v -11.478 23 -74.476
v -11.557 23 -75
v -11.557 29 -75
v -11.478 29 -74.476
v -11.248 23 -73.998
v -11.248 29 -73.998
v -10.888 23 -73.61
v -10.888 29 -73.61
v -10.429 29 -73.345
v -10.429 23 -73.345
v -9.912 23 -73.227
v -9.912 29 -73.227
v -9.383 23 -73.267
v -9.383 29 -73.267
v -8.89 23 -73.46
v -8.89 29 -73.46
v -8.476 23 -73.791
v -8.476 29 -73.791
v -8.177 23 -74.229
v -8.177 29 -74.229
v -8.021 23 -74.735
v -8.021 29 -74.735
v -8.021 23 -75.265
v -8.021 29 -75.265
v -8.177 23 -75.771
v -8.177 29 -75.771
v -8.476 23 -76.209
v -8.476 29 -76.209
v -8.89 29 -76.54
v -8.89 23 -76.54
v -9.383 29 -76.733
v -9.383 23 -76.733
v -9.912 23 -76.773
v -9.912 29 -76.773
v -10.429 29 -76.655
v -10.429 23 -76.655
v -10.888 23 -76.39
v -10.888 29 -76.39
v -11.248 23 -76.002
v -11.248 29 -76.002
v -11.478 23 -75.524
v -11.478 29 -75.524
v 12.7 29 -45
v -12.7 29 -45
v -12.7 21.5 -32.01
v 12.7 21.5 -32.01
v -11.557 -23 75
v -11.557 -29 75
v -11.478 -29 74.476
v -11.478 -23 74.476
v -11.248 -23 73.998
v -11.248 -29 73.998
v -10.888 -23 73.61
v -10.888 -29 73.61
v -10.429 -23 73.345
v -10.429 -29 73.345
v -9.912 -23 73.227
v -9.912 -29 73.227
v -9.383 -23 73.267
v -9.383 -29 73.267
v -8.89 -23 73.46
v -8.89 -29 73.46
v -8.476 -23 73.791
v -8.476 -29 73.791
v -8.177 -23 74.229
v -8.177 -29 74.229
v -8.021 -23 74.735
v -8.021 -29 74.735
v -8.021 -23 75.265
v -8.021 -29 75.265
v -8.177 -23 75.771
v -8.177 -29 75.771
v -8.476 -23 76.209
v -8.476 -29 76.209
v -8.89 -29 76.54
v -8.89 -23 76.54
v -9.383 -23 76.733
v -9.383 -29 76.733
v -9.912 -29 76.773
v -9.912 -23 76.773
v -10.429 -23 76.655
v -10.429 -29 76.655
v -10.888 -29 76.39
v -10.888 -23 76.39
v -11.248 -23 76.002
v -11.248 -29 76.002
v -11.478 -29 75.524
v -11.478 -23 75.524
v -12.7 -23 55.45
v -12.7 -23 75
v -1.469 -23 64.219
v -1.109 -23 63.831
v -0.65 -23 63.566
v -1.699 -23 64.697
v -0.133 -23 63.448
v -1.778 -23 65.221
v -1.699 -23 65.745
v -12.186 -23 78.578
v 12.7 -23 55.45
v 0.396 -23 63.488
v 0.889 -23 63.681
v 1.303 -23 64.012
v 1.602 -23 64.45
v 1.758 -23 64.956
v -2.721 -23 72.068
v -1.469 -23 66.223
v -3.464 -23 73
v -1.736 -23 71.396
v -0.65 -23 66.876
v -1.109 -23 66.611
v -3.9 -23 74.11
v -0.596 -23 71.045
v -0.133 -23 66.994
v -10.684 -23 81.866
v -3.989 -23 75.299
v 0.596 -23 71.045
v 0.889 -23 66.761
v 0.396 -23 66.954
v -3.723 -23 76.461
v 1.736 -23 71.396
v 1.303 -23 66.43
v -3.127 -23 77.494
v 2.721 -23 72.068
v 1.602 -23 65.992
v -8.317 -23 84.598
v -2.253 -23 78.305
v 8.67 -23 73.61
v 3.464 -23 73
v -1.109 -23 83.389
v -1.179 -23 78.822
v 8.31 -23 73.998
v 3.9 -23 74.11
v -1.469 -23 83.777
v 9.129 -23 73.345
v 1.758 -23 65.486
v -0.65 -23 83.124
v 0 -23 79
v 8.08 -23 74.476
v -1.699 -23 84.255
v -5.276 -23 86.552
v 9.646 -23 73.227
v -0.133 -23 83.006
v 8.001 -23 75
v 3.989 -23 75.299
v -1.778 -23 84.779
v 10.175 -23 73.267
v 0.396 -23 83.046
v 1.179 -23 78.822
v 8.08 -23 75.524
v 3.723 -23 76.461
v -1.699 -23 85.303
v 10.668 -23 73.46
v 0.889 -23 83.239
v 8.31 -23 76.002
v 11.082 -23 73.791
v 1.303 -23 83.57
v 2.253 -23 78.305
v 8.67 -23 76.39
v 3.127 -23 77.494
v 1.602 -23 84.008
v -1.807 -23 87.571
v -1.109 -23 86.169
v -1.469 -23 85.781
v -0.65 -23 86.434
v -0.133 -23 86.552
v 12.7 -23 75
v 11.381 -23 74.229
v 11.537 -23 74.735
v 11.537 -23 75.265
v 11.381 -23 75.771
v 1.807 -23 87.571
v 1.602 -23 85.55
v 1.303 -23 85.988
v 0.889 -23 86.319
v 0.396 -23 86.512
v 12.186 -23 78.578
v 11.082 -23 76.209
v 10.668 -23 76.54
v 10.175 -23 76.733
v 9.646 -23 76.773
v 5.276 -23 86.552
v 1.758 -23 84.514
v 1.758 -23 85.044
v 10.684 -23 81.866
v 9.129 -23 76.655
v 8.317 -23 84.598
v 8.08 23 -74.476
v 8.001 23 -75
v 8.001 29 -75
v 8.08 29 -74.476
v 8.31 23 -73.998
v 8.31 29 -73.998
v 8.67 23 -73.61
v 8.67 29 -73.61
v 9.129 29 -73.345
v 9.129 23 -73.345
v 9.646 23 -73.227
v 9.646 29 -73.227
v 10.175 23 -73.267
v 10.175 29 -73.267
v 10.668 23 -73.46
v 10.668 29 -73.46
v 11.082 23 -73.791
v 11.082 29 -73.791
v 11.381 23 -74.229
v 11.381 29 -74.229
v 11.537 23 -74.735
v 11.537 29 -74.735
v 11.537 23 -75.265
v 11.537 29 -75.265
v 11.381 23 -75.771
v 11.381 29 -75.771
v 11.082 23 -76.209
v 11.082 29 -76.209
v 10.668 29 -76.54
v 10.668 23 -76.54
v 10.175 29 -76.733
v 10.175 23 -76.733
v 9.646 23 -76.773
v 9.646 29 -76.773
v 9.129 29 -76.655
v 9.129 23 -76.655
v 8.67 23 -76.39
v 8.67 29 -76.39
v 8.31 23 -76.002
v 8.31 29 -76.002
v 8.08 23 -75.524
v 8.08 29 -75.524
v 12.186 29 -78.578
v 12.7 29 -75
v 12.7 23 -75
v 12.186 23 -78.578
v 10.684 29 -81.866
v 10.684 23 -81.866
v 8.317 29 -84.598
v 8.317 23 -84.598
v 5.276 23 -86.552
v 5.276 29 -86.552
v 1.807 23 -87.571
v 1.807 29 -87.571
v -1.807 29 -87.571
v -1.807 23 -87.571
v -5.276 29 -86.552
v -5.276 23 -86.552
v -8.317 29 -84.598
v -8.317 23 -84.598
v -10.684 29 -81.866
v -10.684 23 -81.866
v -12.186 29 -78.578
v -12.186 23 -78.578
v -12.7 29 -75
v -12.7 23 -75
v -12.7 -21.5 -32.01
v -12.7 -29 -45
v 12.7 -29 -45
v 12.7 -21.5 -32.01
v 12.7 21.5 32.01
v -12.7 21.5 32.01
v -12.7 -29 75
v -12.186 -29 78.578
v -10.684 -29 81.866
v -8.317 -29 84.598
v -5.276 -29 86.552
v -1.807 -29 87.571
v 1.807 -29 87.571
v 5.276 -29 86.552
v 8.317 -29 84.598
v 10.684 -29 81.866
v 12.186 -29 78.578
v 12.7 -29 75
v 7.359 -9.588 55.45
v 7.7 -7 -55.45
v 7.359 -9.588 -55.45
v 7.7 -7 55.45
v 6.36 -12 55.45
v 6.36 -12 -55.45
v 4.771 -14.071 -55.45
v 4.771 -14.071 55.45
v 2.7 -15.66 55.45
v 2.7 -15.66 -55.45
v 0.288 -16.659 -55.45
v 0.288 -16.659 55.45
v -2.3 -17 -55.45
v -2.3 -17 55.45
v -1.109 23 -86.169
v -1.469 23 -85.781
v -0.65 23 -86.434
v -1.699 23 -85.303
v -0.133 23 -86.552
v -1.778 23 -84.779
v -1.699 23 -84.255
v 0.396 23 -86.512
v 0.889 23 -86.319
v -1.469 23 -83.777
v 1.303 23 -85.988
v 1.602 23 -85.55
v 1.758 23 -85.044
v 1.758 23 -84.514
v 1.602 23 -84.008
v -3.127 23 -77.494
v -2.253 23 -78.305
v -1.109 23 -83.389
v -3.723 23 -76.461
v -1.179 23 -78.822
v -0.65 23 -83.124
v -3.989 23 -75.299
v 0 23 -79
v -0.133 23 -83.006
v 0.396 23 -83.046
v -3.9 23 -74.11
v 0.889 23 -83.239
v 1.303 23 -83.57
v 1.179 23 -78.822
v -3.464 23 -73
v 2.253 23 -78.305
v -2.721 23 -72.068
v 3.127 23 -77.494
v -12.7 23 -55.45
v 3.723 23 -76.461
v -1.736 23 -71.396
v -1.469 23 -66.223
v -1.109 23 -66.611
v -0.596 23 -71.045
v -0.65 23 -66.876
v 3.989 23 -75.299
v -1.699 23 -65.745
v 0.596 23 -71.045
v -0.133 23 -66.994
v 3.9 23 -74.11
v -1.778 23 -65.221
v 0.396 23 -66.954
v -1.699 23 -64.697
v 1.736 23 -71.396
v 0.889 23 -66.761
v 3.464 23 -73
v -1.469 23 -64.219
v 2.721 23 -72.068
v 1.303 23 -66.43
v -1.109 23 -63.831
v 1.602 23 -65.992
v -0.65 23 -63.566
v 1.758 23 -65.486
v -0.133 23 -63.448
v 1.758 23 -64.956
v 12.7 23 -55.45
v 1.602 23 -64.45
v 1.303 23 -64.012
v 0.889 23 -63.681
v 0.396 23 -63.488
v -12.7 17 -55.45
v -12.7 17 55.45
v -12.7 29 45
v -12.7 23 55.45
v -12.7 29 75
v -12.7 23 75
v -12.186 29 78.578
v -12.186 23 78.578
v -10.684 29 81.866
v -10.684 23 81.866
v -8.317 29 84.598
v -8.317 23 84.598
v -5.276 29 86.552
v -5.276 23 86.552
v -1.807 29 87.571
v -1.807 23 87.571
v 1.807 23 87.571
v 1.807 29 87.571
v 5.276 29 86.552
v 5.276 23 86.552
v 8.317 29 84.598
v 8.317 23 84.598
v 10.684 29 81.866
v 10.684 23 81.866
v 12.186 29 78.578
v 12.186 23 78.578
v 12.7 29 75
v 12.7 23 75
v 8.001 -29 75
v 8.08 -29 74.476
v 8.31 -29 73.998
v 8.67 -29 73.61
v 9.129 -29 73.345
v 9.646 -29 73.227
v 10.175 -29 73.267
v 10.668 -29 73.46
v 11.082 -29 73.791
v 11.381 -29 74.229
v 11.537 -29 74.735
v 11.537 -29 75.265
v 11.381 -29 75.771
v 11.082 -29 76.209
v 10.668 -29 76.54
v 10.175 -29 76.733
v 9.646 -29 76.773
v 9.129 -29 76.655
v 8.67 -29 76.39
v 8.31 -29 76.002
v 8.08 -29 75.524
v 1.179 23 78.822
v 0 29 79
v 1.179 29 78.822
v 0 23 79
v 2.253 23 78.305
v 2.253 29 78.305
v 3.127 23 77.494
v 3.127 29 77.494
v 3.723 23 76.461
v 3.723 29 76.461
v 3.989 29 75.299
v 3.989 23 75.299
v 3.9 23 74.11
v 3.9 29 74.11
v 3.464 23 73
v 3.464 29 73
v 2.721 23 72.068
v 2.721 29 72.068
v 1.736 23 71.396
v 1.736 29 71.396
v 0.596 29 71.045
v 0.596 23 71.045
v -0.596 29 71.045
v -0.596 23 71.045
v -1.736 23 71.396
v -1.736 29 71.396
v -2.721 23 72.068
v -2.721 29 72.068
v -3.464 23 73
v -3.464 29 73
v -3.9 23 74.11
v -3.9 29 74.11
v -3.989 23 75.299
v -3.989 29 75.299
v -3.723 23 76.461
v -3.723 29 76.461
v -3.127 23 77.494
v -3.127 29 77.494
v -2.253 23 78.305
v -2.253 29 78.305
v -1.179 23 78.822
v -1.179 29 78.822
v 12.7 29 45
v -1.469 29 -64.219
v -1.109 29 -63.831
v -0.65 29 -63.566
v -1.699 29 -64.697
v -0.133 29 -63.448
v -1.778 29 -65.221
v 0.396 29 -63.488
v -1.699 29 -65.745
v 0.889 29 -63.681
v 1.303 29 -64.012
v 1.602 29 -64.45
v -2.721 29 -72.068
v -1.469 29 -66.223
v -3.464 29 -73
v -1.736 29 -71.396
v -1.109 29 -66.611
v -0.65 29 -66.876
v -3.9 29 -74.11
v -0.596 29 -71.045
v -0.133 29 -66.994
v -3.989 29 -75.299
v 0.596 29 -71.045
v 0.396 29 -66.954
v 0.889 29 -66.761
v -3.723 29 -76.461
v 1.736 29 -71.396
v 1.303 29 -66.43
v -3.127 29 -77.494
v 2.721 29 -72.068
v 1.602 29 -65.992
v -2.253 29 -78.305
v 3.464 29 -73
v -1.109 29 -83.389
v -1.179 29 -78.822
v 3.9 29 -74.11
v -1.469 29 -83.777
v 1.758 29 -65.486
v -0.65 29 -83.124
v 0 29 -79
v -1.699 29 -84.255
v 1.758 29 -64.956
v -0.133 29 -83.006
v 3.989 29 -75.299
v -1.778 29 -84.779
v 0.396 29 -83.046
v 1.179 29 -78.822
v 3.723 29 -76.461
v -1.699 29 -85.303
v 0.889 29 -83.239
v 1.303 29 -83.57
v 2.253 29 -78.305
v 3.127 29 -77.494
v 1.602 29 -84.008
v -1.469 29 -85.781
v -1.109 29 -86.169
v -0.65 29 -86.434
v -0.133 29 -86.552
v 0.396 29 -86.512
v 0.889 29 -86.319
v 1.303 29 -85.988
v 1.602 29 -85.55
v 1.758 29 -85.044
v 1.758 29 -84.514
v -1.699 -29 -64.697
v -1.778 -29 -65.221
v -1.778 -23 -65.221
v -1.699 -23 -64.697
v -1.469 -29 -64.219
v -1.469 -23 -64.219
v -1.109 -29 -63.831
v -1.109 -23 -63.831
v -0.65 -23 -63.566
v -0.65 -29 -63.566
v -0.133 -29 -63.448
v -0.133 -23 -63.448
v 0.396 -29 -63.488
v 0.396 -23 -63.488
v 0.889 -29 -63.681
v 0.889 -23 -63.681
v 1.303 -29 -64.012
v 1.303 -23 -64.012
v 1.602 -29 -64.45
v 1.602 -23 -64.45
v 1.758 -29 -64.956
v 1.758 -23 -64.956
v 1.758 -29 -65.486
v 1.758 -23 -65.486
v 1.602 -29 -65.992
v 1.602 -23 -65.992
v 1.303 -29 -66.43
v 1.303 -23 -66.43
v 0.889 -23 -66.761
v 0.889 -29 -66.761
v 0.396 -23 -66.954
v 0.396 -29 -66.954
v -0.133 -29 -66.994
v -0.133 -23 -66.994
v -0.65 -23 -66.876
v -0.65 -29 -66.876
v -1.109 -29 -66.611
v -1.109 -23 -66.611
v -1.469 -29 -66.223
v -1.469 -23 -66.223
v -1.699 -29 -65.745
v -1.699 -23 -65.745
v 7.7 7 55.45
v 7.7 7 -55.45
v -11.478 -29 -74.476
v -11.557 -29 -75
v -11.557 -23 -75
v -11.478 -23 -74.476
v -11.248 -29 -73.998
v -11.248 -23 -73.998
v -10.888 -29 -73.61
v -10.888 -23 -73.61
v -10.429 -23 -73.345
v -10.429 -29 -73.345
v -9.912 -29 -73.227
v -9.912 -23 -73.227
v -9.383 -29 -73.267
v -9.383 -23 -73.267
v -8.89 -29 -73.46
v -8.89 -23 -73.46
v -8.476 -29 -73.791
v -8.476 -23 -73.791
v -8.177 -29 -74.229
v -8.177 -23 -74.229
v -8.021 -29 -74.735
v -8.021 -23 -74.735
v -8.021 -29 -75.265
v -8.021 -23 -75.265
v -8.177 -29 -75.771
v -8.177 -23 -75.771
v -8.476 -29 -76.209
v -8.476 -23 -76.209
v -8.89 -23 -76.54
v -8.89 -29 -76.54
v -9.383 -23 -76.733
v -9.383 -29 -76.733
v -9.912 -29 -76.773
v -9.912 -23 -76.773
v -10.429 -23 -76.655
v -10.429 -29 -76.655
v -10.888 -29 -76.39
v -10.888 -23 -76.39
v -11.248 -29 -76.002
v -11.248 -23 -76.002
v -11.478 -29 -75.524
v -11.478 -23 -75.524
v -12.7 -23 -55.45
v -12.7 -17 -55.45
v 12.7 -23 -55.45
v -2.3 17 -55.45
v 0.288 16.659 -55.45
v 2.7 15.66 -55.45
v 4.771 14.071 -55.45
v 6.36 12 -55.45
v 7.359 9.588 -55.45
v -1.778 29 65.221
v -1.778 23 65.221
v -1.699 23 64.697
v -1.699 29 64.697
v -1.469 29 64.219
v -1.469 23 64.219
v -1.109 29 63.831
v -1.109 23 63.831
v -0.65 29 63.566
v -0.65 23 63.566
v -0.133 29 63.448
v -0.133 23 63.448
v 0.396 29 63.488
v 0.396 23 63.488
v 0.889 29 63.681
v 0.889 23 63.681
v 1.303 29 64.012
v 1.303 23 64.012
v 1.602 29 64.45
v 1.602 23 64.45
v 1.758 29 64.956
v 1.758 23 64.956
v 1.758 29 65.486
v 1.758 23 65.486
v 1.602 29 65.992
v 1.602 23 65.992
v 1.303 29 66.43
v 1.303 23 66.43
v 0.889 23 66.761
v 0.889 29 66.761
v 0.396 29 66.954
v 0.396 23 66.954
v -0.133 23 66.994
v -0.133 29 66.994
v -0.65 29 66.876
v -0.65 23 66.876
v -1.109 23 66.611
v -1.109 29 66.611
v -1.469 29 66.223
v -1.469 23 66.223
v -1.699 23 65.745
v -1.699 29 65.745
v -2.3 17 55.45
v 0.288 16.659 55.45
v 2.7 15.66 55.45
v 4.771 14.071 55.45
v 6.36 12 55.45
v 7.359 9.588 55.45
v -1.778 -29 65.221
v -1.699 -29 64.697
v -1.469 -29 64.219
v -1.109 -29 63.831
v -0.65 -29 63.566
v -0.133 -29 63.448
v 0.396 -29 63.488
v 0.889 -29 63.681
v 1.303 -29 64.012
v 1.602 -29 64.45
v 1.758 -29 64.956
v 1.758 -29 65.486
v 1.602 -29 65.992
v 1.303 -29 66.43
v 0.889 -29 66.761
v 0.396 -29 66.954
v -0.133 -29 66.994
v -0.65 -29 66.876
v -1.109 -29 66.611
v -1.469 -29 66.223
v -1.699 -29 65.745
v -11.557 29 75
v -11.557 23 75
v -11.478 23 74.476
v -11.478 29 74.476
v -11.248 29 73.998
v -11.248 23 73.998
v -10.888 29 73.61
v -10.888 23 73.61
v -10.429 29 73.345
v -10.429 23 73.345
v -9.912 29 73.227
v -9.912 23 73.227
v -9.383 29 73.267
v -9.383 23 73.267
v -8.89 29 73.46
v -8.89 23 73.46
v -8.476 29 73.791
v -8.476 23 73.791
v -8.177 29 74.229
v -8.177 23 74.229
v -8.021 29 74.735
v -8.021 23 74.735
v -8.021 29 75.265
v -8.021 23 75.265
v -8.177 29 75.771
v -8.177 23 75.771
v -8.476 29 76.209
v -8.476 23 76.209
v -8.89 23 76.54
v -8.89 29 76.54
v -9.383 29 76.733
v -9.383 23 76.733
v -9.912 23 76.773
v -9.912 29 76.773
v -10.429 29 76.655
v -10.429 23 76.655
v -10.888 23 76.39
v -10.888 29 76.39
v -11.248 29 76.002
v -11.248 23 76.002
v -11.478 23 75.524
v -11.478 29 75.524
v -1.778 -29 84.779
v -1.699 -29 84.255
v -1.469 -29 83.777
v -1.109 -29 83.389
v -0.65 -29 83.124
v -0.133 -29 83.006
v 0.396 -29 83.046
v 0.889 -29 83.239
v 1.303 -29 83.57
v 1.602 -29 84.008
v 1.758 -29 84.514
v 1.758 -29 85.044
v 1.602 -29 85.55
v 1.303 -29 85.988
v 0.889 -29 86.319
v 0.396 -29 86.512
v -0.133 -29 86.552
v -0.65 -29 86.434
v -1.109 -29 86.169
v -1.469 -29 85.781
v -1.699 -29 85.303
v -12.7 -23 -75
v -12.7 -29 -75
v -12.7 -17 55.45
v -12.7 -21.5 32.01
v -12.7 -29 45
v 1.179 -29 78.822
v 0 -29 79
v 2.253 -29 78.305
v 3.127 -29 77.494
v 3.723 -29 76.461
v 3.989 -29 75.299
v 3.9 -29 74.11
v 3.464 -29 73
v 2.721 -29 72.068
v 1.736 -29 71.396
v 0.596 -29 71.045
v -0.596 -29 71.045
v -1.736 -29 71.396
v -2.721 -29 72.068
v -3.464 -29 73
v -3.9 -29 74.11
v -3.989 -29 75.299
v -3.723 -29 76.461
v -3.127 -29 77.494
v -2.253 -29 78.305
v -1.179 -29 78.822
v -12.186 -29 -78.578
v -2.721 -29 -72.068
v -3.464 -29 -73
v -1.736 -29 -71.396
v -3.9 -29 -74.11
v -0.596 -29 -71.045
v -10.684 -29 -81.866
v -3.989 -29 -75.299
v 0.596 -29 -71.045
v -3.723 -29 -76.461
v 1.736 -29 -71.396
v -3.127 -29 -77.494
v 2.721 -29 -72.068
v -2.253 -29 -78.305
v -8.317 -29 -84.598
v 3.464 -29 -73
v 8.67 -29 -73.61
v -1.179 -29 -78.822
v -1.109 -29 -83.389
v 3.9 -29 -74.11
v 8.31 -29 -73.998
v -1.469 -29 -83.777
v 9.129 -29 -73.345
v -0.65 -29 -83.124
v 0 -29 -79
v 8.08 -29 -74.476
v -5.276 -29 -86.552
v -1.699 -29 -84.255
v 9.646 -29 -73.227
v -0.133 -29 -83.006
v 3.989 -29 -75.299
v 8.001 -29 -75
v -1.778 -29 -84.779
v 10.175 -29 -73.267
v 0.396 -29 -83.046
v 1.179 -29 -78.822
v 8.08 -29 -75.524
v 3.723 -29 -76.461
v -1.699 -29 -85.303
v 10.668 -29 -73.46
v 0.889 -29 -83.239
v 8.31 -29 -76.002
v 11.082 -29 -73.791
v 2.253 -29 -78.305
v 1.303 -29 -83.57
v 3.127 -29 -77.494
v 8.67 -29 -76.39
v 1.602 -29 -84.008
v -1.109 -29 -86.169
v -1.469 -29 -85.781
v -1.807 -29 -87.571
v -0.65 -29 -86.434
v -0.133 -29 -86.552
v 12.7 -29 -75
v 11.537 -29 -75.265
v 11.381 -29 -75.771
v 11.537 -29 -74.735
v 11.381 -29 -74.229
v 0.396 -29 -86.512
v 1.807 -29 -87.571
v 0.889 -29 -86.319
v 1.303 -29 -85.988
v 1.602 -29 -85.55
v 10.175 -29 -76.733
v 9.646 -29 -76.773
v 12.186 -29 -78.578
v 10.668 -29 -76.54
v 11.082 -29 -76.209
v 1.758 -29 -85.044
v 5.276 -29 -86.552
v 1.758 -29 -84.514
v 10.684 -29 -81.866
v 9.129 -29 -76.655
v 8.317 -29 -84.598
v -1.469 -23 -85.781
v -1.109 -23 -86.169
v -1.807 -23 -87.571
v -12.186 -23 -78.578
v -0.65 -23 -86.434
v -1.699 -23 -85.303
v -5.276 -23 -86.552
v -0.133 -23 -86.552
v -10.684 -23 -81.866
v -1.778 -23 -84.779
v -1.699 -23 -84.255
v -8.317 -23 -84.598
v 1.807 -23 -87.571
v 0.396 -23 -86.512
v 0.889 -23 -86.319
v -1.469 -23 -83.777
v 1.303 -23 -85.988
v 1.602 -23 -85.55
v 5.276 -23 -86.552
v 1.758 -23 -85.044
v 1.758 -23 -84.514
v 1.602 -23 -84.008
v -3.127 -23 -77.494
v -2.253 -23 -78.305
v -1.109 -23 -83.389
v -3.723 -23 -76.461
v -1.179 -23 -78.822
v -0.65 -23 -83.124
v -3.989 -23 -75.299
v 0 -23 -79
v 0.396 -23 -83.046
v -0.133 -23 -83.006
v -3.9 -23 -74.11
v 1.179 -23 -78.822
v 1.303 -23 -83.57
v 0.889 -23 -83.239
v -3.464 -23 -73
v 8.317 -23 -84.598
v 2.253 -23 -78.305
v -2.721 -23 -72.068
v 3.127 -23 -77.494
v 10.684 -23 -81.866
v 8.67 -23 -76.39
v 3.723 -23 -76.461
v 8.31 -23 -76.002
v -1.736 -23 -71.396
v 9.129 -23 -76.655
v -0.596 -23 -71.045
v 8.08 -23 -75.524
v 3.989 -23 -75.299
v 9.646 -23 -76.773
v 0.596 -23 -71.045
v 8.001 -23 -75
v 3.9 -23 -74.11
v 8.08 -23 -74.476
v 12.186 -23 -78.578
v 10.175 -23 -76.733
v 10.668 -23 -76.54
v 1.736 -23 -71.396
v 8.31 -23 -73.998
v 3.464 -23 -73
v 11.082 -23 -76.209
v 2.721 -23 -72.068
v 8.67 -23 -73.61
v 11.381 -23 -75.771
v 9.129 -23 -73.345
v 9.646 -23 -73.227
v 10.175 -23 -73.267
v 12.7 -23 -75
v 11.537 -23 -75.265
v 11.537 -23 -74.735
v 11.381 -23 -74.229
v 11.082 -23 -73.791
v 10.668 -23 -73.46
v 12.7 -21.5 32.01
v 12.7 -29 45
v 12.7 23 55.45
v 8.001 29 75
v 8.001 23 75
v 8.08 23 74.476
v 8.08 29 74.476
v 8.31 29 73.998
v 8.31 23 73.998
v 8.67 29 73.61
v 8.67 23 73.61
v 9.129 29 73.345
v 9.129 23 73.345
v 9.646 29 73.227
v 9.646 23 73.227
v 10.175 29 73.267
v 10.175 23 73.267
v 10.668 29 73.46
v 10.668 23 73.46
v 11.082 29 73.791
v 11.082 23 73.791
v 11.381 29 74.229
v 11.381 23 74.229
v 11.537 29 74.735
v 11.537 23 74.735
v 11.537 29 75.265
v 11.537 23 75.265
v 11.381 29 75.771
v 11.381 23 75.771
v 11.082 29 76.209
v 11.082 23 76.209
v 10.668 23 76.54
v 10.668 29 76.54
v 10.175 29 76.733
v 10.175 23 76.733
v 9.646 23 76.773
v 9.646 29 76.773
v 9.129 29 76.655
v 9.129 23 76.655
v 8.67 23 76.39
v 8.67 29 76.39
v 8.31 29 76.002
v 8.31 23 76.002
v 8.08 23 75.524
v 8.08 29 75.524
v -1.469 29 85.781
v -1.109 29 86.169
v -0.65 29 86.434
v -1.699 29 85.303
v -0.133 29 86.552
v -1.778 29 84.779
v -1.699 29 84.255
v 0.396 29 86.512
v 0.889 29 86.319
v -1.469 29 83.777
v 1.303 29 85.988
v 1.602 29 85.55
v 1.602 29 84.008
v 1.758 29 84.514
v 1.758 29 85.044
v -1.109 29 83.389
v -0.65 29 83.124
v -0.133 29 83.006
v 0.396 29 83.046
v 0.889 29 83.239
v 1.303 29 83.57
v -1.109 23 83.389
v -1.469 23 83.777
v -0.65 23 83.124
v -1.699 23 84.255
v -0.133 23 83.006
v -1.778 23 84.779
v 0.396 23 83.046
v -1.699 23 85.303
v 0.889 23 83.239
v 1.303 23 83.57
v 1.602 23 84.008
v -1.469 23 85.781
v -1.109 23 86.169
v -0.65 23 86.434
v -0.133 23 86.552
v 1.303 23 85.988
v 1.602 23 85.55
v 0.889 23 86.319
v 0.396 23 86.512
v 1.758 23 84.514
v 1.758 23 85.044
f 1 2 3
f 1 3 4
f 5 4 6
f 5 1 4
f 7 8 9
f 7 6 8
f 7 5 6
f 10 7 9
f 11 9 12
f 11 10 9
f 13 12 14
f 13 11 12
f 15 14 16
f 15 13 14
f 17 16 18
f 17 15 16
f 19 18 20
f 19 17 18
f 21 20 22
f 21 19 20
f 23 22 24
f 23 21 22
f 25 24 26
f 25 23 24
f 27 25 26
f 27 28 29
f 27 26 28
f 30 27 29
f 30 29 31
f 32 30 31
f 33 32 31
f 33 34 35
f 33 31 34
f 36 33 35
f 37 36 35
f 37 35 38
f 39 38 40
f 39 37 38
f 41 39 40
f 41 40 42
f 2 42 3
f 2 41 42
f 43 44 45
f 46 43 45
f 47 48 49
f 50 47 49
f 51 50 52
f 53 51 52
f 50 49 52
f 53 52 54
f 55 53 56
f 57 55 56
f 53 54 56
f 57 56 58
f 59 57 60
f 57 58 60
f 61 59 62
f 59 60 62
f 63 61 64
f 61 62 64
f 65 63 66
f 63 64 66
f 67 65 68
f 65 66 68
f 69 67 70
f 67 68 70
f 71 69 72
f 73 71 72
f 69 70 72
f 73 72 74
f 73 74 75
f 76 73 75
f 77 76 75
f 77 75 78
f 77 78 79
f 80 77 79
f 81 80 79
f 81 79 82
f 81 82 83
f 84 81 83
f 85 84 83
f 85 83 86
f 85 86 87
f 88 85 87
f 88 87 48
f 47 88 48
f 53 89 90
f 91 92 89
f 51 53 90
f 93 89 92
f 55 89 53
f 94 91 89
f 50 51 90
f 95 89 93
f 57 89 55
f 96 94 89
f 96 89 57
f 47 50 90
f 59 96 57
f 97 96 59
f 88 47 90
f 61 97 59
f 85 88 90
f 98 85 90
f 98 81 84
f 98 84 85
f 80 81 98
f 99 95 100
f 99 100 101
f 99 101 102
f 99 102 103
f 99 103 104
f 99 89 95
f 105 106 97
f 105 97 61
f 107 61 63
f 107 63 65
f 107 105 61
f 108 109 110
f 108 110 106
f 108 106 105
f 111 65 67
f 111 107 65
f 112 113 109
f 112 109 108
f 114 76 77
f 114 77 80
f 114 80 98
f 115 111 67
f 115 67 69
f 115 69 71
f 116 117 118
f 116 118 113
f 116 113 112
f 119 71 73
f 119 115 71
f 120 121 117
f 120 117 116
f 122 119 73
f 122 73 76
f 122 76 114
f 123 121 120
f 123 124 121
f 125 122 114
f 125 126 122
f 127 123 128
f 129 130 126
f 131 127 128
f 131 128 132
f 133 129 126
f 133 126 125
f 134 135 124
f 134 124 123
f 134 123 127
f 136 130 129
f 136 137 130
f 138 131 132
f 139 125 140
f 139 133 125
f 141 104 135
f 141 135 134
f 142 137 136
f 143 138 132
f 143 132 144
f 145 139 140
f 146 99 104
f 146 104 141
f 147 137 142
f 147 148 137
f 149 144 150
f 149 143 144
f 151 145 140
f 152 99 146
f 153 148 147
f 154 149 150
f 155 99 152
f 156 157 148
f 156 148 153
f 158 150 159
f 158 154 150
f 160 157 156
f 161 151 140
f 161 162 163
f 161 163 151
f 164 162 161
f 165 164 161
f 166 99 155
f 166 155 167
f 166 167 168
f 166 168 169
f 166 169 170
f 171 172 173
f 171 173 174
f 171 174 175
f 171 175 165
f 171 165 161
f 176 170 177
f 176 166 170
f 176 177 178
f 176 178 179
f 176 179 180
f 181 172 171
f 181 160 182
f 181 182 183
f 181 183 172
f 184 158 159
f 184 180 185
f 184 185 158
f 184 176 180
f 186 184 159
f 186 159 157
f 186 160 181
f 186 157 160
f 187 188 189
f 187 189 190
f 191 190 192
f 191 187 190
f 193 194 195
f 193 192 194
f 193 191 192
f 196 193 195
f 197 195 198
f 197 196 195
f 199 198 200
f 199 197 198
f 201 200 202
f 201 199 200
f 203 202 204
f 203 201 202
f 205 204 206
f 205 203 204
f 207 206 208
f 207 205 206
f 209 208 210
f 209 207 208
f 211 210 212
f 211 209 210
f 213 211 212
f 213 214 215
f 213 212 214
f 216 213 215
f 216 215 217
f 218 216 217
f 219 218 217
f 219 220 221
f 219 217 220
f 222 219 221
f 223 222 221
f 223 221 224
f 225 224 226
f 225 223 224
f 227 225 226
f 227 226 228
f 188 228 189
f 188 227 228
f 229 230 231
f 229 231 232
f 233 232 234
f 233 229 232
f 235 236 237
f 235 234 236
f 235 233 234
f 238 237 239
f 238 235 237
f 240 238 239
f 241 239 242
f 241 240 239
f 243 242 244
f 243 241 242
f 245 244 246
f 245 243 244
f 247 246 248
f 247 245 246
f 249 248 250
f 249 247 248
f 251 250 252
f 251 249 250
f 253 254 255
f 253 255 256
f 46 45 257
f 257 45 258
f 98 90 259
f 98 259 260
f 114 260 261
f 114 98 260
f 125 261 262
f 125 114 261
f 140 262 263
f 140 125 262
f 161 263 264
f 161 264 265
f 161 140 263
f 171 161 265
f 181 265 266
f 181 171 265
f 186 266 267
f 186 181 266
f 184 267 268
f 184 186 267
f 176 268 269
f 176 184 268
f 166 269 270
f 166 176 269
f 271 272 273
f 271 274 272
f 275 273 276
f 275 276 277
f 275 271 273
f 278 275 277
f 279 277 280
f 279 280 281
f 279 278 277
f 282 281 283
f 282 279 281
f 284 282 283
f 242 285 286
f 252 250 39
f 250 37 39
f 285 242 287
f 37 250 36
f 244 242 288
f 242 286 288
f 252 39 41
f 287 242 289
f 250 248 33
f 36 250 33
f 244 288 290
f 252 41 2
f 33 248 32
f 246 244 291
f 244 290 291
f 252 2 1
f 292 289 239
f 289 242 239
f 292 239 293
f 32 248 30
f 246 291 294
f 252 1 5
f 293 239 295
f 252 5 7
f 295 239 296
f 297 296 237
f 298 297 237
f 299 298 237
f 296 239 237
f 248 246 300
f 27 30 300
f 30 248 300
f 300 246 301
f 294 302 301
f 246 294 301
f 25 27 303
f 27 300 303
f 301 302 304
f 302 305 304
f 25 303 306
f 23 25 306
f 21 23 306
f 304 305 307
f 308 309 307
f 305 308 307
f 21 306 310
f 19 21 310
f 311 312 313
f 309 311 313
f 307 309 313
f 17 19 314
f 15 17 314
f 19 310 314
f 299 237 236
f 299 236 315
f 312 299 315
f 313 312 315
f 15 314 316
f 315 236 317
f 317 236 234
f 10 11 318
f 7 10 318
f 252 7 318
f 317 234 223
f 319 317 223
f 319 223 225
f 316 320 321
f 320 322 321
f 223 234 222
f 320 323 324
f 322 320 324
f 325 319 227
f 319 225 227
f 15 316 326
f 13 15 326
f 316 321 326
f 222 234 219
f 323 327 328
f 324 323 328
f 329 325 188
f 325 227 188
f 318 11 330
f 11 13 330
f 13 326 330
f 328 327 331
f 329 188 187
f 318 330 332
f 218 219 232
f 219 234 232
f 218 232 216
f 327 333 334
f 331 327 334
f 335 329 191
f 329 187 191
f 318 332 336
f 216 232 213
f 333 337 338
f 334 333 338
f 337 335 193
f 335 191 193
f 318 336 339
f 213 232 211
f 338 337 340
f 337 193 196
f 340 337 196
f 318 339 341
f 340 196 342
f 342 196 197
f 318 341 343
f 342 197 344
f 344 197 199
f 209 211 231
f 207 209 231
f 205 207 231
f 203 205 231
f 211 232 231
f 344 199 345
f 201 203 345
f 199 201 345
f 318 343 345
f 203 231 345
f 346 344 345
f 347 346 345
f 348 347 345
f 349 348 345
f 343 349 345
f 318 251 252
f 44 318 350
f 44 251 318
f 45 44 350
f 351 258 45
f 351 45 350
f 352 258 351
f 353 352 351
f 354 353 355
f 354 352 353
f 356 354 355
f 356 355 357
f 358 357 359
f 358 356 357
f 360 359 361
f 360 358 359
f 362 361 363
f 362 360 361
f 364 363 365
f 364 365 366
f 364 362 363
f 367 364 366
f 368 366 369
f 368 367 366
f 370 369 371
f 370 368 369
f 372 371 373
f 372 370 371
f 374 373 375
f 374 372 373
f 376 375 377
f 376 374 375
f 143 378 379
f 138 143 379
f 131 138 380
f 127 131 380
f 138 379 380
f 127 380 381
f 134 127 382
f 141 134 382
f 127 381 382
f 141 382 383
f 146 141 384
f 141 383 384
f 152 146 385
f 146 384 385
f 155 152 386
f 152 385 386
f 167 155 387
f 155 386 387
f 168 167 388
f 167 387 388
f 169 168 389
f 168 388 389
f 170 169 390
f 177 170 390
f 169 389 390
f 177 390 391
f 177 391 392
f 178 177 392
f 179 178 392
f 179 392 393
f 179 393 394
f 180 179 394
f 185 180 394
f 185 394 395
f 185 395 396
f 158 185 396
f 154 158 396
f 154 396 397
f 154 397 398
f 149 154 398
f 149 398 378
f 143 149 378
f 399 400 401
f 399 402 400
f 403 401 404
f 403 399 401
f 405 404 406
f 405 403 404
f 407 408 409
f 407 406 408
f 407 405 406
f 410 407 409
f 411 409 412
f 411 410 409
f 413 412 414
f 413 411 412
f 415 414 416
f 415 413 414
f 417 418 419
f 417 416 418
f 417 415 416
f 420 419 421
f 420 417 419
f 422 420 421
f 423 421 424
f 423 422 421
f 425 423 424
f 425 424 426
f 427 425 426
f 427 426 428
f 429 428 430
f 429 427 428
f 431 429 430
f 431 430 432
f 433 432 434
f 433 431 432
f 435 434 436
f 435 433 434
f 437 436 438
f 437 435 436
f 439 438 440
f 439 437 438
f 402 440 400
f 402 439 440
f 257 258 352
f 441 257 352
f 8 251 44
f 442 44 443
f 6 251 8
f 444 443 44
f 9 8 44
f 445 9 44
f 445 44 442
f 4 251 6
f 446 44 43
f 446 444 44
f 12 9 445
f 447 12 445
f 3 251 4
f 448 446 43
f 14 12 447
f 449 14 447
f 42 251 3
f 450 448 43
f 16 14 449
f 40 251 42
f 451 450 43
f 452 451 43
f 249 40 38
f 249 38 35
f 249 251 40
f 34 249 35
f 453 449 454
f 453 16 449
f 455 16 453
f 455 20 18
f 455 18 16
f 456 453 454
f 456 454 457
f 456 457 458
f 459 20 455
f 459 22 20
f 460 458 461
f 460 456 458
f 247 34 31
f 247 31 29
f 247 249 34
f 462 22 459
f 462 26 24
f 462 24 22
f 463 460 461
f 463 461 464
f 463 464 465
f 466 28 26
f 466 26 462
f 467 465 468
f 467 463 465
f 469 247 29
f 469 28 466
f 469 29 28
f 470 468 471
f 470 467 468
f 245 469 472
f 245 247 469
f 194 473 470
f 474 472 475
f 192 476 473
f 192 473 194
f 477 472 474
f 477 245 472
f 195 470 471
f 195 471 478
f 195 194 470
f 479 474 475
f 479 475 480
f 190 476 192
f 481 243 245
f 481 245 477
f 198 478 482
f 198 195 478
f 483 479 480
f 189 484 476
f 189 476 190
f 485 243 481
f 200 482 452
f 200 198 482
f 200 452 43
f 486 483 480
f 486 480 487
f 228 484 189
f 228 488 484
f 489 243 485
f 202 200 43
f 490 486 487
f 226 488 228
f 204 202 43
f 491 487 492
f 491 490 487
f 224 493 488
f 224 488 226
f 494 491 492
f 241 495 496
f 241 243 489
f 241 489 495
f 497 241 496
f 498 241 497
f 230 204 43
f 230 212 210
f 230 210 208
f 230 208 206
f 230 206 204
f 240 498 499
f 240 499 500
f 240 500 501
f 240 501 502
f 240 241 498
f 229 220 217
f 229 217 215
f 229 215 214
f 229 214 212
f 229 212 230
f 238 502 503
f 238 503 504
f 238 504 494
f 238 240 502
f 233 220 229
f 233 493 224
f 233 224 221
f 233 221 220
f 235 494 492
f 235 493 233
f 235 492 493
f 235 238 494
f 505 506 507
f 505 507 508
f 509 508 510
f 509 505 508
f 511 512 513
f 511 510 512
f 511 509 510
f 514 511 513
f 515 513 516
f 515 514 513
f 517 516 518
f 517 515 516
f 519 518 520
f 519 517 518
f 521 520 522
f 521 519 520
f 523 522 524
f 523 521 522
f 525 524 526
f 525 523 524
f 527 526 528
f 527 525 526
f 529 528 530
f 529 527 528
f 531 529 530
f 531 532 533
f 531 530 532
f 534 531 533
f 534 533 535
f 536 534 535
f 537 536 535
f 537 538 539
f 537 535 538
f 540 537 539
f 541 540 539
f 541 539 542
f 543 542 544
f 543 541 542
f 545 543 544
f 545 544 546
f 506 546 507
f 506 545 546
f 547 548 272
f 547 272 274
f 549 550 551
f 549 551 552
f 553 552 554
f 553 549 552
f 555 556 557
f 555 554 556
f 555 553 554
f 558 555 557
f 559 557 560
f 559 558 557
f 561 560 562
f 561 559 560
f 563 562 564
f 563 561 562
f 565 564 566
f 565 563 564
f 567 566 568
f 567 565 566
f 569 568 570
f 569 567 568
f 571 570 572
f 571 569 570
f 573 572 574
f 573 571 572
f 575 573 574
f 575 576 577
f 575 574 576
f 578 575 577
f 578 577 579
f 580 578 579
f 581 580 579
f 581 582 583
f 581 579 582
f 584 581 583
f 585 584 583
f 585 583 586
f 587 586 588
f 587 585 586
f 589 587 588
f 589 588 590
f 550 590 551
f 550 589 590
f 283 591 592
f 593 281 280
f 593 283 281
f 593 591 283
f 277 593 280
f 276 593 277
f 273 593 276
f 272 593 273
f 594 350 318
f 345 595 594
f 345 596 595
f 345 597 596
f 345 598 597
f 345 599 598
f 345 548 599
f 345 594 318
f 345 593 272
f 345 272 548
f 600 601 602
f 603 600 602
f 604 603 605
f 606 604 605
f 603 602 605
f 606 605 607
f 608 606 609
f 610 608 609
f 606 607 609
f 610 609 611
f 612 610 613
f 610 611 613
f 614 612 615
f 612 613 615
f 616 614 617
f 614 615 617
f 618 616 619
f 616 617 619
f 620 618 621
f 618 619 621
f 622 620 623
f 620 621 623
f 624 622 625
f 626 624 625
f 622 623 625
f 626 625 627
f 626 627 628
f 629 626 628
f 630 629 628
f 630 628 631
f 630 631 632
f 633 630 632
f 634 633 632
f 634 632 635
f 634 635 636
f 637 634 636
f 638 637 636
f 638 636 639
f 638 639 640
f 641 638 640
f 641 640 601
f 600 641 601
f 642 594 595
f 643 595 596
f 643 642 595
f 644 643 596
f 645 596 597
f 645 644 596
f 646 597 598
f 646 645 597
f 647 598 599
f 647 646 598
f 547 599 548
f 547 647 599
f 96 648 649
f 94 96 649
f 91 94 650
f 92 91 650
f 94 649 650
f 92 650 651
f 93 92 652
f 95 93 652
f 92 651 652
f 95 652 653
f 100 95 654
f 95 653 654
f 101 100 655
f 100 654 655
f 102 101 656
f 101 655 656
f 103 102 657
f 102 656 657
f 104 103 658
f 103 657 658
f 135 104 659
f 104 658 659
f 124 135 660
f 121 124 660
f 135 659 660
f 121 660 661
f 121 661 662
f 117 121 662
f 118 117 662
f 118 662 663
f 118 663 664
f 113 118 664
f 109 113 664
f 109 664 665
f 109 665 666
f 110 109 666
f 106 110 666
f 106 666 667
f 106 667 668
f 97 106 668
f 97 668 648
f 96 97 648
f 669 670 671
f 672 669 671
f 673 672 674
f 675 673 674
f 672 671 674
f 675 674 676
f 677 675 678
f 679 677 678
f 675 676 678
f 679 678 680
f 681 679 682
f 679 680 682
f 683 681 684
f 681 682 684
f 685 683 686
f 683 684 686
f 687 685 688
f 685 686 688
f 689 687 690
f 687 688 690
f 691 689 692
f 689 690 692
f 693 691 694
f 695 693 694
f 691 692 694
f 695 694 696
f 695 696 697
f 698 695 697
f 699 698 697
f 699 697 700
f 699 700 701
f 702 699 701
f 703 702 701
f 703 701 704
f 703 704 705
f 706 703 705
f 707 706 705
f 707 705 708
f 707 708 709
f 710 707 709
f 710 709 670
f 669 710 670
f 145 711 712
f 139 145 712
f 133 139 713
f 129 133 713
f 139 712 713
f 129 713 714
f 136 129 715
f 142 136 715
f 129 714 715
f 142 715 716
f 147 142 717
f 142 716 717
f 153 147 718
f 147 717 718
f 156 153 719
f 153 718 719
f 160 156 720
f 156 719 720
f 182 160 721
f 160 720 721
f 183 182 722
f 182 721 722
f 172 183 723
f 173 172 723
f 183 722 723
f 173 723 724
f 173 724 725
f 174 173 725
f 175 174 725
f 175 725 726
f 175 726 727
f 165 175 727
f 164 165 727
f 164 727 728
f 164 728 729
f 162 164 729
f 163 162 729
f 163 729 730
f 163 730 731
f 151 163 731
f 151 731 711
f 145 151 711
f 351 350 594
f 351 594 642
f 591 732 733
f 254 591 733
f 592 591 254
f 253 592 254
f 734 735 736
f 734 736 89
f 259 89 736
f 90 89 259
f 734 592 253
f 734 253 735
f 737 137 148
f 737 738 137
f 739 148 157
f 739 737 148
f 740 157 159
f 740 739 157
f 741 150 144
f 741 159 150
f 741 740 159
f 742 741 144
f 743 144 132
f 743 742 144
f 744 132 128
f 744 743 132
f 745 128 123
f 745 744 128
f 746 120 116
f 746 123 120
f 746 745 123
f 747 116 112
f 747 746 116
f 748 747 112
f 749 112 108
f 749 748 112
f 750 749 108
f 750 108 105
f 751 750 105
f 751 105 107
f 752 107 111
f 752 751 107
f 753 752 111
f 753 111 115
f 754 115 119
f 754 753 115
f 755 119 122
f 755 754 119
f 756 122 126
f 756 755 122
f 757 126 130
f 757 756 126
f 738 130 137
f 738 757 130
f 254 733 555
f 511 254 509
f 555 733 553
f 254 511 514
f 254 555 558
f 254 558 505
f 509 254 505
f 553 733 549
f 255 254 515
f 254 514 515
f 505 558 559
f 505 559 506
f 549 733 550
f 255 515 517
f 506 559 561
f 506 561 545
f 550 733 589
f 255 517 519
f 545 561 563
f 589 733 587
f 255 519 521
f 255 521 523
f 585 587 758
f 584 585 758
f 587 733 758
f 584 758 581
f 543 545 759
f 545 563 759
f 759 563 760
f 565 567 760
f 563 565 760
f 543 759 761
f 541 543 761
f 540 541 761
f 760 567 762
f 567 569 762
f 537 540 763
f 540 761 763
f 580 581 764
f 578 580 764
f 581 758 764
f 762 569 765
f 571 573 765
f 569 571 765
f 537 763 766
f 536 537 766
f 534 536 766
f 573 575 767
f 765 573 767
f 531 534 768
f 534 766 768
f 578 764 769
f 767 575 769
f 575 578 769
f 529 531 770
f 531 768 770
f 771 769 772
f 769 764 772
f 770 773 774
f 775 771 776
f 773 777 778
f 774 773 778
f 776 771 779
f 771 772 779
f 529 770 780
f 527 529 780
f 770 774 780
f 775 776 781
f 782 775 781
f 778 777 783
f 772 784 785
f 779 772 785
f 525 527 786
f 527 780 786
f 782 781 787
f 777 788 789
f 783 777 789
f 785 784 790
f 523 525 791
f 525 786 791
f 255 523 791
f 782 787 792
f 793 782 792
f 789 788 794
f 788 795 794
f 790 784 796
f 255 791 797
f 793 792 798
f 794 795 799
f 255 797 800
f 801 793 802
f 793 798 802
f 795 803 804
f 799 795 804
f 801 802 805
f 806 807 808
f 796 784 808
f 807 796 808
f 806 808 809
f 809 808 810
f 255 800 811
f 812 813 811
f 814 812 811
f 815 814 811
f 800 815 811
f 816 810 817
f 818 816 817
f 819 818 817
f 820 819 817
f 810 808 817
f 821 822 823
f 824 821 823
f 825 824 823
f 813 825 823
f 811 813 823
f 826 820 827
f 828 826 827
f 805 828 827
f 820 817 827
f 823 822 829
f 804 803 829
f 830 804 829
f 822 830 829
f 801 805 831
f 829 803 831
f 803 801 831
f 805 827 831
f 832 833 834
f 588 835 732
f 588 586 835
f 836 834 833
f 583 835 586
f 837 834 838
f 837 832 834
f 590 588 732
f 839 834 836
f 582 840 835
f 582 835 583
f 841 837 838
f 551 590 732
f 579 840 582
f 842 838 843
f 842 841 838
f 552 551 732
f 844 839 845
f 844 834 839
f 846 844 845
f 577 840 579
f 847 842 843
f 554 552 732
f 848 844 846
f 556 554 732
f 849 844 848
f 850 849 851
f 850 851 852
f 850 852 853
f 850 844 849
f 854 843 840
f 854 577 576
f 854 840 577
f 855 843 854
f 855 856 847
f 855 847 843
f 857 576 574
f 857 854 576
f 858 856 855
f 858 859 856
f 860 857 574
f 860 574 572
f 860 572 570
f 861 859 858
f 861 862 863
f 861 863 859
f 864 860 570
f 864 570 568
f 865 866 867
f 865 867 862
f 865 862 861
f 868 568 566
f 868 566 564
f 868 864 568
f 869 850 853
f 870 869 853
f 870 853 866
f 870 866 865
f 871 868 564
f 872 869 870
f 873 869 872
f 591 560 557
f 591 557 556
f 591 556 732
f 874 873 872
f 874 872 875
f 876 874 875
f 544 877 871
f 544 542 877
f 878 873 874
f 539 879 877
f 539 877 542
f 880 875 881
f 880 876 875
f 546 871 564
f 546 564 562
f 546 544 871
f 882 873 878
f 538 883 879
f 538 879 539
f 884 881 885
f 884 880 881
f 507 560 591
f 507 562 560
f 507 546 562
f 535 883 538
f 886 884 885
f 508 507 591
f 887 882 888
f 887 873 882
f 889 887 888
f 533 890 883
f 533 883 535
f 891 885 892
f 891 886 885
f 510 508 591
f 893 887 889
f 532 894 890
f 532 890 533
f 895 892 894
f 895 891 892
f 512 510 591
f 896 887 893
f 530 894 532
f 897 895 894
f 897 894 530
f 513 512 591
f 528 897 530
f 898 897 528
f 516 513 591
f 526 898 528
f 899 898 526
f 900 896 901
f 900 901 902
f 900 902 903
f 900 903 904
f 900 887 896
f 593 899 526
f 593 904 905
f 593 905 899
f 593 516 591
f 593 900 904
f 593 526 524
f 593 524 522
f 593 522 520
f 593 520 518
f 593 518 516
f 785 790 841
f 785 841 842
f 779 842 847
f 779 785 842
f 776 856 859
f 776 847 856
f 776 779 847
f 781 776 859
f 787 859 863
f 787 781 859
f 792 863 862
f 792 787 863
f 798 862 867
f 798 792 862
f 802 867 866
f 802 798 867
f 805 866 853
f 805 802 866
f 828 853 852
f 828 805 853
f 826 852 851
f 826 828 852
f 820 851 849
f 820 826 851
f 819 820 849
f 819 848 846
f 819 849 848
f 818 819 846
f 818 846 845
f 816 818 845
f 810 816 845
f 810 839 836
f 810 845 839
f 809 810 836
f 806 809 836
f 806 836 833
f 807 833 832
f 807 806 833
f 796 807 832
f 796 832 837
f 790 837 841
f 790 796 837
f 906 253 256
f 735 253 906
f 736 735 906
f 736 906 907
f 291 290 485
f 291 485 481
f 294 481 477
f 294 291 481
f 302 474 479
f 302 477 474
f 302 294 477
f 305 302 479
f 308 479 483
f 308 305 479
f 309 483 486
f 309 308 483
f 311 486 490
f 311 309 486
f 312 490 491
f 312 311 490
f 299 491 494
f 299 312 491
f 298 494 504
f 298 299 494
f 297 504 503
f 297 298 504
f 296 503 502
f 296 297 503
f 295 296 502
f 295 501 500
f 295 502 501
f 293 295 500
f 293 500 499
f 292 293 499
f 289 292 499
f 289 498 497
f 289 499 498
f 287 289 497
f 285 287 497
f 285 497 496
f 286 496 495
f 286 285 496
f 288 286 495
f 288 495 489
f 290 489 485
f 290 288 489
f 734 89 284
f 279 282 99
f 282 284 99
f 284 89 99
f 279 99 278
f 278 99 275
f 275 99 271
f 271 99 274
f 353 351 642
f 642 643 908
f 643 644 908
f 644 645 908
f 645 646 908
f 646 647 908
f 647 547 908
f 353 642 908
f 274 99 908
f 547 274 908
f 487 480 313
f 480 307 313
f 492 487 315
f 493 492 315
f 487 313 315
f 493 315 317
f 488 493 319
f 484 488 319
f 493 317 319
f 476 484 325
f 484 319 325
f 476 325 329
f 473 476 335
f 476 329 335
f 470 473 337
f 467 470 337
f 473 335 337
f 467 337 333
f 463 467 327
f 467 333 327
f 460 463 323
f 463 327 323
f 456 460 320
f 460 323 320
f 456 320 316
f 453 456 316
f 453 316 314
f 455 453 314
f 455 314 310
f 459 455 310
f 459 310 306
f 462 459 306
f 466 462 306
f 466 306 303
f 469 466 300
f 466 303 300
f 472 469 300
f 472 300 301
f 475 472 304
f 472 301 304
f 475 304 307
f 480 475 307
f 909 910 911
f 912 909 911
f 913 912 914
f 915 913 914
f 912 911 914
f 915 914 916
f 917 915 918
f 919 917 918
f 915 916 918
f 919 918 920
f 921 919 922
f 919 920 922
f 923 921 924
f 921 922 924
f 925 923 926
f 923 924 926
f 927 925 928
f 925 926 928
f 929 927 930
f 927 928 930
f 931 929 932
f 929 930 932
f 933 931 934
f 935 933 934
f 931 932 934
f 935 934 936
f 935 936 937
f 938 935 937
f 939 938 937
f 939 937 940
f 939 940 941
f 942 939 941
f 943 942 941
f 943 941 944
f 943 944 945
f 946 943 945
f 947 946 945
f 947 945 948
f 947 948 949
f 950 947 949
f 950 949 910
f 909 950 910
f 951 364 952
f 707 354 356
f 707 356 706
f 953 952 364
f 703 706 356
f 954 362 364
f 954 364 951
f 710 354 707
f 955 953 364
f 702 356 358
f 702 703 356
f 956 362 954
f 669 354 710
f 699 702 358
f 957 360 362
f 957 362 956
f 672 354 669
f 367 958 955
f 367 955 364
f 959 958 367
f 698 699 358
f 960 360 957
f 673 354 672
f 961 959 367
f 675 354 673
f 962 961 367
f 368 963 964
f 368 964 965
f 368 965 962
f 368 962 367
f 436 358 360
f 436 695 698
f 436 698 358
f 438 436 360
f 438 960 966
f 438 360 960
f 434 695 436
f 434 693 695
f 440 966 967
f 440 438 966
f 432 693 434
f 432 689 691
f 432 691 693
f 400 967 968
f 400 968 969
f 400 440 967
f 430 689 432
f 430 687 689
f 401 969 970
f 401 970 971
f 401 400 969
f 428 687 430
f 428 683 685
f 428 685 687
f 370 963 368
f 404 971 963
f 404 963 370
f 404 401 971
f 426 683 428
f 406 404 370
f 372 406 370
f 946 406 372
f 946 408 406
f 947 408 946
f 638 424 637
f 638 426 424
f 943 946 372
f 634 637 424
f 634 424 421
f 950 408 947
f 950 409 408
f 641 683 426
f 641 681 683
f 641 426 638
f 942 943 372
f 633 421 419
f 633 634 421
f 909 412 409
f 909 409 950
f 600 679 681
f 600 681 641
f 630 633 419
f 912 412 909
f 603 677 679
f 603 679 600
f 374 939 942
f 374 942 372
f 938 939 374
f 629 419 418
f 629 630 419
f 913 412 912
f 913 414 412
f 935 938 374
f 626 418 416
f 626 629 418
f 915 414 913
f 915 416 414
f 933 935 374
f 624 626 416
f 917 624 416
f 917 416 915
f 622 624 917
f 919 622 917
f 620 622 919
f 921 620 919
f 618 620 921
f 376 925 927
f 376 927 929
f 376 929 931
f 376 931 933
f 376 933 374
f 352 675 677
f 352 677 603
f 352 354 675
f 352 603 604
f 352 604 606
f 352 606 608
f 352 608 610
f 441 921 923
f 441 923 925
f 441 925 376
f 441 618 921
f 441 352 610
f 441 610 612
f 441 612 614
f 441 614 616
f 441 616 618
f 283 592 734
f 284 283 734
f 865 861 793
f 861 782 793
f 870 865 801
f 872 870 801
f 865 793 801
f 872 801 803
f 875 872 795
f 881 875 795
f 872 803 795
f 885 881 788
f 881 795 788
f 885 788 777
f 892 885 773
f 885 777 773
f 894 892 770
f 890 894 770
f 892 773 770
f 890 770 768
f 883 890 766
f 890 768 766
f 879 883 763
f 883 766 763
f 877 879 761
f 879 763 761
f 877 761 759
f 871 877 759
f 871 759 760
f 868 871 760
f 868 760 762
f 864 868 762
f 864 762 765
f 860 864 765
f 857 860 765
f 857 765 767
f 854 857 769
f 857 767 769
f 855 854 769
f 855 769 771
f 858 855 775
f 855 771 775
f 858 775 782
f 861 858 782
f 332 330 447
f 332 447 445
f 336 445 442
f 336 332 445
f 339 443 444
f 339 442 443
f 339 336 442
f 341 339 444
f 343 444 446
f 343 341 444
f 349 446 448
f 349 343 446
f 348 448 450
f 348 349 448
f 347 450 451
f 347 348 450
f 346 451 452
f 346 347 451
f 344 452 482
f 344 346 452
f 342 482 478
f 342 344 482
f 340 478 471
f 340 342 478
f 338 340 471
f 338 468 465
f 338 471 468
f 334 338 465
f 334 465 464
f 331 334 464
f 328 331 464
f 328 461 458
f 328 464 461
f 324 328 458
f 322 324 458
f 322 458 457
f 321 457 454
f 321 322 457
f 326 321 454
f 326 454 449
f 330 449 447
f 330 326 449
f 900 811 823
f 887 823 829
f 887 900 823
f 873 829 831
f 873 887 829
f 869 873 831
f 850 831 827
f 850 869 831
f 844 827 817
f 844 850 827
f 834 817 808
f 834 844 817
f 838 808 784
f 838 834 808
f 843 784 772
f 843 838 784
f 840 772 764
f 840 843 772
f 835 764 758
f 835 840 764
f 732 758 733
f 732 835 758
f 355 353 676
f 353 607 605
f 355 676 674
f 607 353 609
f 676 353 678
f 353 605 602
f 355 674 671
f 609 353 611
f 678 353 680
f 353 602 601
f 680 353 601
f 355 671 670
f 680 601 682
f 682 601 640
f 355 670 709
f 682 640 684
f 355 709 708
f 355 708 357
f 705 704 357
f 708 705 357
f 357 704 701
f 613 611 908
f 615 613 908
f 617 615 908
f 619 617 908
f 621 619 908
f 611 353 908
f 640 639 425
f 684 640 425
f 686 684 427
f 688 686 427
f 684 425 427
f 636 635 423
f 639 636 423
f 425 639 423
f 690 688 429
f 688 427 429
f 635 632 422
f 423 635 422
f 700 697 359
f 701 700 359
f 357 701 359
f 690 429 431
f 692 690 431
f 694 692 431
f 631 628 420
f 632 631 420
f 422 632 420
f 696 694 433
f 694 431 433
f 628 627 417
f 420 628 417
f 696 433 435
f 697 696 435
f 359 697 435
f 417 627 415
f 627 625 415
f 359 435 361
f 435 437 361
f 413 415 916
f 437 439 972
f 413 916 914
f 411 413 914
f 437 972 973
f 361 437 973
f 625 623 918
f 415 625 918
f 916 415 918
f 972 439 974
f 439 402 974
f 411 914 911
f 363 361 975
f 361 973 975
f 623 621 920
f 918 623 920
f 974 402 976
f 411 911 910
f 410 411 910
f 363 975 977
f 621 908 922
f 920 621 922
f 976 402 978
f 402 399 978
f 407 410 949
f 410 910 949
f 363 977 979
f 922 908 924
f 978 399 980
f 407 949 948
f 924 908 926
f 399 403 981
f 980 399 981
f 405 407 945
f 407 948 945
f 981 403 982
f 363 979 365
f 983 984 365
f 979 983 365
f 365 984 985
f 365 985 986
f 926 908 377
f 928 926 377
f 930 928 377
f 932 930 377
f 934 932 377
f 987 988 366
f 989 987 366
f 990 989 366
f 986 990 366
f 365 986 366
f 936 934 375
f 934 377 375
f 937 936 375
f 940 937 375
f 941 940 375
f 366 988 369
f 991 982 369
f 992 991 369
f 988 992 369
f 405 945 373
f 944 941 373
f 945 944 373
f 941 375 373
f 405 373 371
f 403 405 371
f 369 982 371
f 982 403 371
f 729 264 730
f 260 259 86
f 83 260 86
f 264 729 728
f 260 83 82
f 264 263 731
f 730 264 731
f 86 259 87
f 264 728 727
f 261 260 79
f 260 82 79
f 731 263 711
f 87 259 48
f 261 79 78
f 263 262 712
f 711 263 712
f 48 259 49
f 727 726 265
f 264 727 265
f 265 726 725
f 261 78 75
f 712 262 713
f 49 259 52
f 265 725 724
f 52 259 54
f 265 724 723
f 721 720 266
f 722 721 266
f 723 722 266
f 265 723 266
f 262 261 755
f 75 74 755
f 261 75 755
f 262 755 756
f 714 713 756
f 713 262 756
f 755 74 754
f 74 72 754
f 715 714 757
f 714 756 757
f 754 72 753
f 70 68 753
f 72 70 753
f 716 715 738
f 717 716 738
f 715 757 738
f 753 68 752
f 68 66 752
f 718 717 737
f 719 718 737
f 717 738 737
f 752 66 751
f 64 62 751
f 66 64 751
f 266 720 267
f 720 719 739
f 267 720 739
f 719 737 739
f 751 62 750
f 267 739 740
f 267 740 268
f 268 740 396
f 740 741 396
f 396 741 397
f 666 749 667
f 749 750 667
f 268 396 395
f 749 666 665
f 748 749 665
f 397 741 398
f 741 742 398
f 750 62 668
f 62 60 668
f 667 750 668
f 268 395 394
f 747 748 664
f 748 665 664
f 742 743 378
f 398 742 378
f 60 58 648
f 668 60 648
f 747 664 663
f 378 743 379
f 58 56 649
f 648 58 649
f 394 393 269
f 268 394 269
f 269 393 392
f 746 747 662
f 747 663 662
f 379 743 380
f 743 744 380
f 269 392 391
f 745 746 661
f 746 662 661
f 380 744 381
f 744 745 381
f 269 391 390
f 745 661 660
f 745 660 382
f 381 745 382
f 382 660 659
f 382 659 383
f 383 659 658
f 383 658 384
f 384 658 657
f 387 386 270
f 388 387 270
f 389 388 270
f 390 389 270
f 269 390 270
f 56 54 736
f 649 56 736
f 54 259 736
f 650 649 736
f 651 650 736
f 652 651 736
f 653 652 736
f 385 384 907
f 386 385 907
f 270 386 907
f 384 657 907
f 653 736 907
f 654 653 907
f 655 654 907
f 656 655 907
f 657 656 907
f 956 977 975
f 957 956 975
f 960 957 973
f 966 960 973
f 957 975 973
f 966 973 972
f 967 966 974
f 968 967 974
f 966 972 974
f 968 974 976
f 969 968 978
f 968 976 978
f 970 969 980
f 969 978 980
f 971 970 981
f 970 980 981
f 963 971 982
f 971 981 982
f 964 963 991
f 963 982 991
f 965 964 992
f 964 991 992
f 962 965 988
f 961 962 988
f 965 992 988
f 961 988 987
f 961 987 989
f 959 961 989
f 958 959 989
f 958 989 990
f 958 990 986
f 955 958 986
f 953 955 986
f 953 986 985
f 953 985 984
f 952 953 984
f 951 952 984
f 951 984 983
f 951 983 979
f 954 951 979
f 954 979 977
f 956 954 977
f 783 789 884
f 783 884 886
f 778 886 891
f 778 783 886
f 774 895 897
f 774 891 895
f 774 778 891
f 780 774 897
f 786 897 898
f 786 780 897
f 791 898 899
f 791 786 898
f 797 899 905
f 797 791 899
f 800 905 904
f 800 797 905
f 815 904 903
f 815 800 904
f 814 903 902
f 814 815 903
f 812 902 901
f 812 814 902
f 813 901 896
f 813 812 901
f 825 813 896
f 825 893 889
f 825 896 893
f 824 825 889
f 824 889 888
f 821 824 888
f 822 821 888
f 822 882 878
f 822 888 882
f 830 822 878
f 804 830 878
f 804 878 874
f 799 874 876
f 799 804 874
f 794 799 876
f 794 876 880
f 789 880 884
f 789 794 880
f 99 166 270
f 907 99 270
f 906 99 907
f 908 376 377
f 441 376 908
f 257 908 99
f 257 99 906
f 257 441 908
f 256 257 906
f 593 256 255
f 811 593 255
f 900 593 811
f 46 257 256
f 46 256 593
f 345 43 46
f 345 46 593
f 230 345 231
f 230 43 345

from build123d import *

# Parameters (mm, degrees)
BOSS_EXTRUDE1_DEPTH          = 29
CUT_EXTRUDE1_DEPTH           = 96.799008346
CUT_EXTRUDE2_DEPTH           = 96.799008346
CUT_EXTRUDE2_DEPTH_BACK      = 96.799008346
SKETCH4_W                    = 32.25
SKETCH4_H                    = 6
SKETCH5_W                    = 175.4
SKETCH5_H                    = 34
CUT_EXTRUDE3_DEPTH           = 20.4
SKETCH6_W                    = 29.649504938
SKETCH6_H                    = 34
CUT_EXTRUDE4_DEPTH           = 95.596247283
SKETCH7_W                    = 29.649504938
SKETCH7_H                    = 34
CUT_EXTRUDE5_DEPTH           = 95.596247283
F_5_32_0_14_DIAMETER_HOLE1_D = 3.556
SKETCH13_R                   = 4
CUT_EXTRUDE6_DEPTH           = 106.908356611
FILLET1_R                    = 10
FILLET2_R                    = 10


with BuildPart() as part:
    # Sketch1 → Boss-Extrude1 (new, symmetric)
    with BuildSketch(Plane(origin=(0, 0, 0), x_dir=(1, 0, 0), z_dir=(0, 1, 0))):
        with BuildLine():
            Line((-12.7, 75), (-12.7, -75))
            ThreePointArc((-12.7, -75), (0, -87.7), (12.7, -75))
            Line((12.7, -75), (12.7, 75))
            ThreePointArc((12.7, 75), (0, 87.7), (-12.7, 75))
        make_face()
    extrude(amount=BOSS_EXTRUDE1_DEPTH, both=True)

    # Sketch3 → Cut-Extrude1 (cut, symmetric)
    with BuildSketch(Plane.ZY.offset(12.7)):
        Polygon((-45, 29), (-32.009618943, 21.5), (32.009618943, 21.5), (45, 29), align=None)
    cut_extrude1 = extrude(amount=CUT_EXTRUDE1_DEPTH, both=True, mode=Mode.SUBTRACT)

    # Mirror1: Cut-Extrude1 across plane
    add(cut_extrude1.mirror(Plane.ZX), mode=Mode.SUBTRACT)

    # Sketch4 → Cut-Extrude2 (cut, two sides: drawn at the far end of the back side and taken through both)
    with BuildSketch(Plane.ZY.offset(12.7).offset(-CUT_EXTRUDE2_DEPTH_BACK)):
        with Locations((71.575, 20)):
            Rectangle(SKETCH4_W, SKETCH4_H)
        with Locations((-71.575, 20)):
            Rectangle(SKETCH4_W, SKETCH4_H)
        with Locations((-71.575, -20)):
            Rectangle(SKETCH4_W, SKETCH4_H)
        with Locations((71.575, -20)):
            Rectangle(SKETCH4_W, SKETCH4_H)
    extrude(amount=CUT_EXTRUDE2_DEPTH + CUT_EXTRUDE2_DEPTH_BACK, mode=Mode.SUBTRACT)

    # Sketch5 → Cut-Extrude3 (cut)
    with BuildSketch(Plane.ZY.offset(12.7)):
        Rectangle(SKETCH5_W, SKETCH5_H)
    extrude(amount=-CUT_EXTRUDE3_DEPTH, mode=Mode.SUBTRACT)

    # Sketch6 → Cut-Extrude4 (cut, through all)
    with BuildSketch(Plane.ZY.offset(-7.7)):
        with Locations((70.274752469, 0)):
            Rectangle(SKETCH6_W, SKETCH6_H)
    extrude(amount=-CUT_EXTRUDE4_DEPTH, mode=Mode.SUBTRACT)

    # Sketch7 → Cut-Extrude5 (cut, through all)
    with BuildSketch(Plane.ZY.offset(-7.7)):
        with Locations((-70.274752469, 0)):
            Rectangle(SKETCH7_W, SKETCH7_H)
    extrude(amount=-CUT_EXTRUDE5_DEPTH, mode=Mode.SUBTRACT)

    # 5/32 (0.14) Diameter Hole1 (through all)
    with Locations(Plane(origin=(0, 29, 0), x_dir=(1, 0, 0), z_dir=(0, 1, 0))):
        with Locations((0, -65.221), (-9.779, -75), (9.779, -75), (0, -84.779)):
            f_5_32_0_14_diameter_hole1 = Hole(F_5_32_0_14_DIAMETER_HOLE1_D / 2)

    # Mirror3: 5/32 (0.14) Diameter Hole1 across plane
    add(f_5_32_0_14_diameter_hole1.mirror(Plane.XY), mode=Mode.SUBTRACT)

    # Sketch13 → Cut-Extrude6 (cut, symmetric)
    with BuildSketch(Plane.XZ.offset(29)):
        with Locations(Location((0, -75, 0), (0, 0, 270))):
            Circle(SKETCH13_R)
    cut_extrude6 = extrude(amount=CUT_EXTRUDE6_DEPTH, both=True, mode=Mode.SUBTRACT)

    # Mirror4: Cut-Extrude6 across plane
    add(cut_extrude6.mirror(Plane.XY), mode=Mode.SUBTRACT)

    # Fillet1
    fillet1_edges = [part.edges().sort_by_distance(p)[0] for p in [
        (7.7, 17, 0),
    ]]
    fillet(fillet1_edges, radius=FILLET1_R)

    # Fillet2
    fillet2_edges = [part.edges().sort_by_distance(p)[0] for p in [
        (7.7, -17, 0),
    ]]
    fillet(fillet2_edges, radius=FILLET2_R)


solid = part.part
